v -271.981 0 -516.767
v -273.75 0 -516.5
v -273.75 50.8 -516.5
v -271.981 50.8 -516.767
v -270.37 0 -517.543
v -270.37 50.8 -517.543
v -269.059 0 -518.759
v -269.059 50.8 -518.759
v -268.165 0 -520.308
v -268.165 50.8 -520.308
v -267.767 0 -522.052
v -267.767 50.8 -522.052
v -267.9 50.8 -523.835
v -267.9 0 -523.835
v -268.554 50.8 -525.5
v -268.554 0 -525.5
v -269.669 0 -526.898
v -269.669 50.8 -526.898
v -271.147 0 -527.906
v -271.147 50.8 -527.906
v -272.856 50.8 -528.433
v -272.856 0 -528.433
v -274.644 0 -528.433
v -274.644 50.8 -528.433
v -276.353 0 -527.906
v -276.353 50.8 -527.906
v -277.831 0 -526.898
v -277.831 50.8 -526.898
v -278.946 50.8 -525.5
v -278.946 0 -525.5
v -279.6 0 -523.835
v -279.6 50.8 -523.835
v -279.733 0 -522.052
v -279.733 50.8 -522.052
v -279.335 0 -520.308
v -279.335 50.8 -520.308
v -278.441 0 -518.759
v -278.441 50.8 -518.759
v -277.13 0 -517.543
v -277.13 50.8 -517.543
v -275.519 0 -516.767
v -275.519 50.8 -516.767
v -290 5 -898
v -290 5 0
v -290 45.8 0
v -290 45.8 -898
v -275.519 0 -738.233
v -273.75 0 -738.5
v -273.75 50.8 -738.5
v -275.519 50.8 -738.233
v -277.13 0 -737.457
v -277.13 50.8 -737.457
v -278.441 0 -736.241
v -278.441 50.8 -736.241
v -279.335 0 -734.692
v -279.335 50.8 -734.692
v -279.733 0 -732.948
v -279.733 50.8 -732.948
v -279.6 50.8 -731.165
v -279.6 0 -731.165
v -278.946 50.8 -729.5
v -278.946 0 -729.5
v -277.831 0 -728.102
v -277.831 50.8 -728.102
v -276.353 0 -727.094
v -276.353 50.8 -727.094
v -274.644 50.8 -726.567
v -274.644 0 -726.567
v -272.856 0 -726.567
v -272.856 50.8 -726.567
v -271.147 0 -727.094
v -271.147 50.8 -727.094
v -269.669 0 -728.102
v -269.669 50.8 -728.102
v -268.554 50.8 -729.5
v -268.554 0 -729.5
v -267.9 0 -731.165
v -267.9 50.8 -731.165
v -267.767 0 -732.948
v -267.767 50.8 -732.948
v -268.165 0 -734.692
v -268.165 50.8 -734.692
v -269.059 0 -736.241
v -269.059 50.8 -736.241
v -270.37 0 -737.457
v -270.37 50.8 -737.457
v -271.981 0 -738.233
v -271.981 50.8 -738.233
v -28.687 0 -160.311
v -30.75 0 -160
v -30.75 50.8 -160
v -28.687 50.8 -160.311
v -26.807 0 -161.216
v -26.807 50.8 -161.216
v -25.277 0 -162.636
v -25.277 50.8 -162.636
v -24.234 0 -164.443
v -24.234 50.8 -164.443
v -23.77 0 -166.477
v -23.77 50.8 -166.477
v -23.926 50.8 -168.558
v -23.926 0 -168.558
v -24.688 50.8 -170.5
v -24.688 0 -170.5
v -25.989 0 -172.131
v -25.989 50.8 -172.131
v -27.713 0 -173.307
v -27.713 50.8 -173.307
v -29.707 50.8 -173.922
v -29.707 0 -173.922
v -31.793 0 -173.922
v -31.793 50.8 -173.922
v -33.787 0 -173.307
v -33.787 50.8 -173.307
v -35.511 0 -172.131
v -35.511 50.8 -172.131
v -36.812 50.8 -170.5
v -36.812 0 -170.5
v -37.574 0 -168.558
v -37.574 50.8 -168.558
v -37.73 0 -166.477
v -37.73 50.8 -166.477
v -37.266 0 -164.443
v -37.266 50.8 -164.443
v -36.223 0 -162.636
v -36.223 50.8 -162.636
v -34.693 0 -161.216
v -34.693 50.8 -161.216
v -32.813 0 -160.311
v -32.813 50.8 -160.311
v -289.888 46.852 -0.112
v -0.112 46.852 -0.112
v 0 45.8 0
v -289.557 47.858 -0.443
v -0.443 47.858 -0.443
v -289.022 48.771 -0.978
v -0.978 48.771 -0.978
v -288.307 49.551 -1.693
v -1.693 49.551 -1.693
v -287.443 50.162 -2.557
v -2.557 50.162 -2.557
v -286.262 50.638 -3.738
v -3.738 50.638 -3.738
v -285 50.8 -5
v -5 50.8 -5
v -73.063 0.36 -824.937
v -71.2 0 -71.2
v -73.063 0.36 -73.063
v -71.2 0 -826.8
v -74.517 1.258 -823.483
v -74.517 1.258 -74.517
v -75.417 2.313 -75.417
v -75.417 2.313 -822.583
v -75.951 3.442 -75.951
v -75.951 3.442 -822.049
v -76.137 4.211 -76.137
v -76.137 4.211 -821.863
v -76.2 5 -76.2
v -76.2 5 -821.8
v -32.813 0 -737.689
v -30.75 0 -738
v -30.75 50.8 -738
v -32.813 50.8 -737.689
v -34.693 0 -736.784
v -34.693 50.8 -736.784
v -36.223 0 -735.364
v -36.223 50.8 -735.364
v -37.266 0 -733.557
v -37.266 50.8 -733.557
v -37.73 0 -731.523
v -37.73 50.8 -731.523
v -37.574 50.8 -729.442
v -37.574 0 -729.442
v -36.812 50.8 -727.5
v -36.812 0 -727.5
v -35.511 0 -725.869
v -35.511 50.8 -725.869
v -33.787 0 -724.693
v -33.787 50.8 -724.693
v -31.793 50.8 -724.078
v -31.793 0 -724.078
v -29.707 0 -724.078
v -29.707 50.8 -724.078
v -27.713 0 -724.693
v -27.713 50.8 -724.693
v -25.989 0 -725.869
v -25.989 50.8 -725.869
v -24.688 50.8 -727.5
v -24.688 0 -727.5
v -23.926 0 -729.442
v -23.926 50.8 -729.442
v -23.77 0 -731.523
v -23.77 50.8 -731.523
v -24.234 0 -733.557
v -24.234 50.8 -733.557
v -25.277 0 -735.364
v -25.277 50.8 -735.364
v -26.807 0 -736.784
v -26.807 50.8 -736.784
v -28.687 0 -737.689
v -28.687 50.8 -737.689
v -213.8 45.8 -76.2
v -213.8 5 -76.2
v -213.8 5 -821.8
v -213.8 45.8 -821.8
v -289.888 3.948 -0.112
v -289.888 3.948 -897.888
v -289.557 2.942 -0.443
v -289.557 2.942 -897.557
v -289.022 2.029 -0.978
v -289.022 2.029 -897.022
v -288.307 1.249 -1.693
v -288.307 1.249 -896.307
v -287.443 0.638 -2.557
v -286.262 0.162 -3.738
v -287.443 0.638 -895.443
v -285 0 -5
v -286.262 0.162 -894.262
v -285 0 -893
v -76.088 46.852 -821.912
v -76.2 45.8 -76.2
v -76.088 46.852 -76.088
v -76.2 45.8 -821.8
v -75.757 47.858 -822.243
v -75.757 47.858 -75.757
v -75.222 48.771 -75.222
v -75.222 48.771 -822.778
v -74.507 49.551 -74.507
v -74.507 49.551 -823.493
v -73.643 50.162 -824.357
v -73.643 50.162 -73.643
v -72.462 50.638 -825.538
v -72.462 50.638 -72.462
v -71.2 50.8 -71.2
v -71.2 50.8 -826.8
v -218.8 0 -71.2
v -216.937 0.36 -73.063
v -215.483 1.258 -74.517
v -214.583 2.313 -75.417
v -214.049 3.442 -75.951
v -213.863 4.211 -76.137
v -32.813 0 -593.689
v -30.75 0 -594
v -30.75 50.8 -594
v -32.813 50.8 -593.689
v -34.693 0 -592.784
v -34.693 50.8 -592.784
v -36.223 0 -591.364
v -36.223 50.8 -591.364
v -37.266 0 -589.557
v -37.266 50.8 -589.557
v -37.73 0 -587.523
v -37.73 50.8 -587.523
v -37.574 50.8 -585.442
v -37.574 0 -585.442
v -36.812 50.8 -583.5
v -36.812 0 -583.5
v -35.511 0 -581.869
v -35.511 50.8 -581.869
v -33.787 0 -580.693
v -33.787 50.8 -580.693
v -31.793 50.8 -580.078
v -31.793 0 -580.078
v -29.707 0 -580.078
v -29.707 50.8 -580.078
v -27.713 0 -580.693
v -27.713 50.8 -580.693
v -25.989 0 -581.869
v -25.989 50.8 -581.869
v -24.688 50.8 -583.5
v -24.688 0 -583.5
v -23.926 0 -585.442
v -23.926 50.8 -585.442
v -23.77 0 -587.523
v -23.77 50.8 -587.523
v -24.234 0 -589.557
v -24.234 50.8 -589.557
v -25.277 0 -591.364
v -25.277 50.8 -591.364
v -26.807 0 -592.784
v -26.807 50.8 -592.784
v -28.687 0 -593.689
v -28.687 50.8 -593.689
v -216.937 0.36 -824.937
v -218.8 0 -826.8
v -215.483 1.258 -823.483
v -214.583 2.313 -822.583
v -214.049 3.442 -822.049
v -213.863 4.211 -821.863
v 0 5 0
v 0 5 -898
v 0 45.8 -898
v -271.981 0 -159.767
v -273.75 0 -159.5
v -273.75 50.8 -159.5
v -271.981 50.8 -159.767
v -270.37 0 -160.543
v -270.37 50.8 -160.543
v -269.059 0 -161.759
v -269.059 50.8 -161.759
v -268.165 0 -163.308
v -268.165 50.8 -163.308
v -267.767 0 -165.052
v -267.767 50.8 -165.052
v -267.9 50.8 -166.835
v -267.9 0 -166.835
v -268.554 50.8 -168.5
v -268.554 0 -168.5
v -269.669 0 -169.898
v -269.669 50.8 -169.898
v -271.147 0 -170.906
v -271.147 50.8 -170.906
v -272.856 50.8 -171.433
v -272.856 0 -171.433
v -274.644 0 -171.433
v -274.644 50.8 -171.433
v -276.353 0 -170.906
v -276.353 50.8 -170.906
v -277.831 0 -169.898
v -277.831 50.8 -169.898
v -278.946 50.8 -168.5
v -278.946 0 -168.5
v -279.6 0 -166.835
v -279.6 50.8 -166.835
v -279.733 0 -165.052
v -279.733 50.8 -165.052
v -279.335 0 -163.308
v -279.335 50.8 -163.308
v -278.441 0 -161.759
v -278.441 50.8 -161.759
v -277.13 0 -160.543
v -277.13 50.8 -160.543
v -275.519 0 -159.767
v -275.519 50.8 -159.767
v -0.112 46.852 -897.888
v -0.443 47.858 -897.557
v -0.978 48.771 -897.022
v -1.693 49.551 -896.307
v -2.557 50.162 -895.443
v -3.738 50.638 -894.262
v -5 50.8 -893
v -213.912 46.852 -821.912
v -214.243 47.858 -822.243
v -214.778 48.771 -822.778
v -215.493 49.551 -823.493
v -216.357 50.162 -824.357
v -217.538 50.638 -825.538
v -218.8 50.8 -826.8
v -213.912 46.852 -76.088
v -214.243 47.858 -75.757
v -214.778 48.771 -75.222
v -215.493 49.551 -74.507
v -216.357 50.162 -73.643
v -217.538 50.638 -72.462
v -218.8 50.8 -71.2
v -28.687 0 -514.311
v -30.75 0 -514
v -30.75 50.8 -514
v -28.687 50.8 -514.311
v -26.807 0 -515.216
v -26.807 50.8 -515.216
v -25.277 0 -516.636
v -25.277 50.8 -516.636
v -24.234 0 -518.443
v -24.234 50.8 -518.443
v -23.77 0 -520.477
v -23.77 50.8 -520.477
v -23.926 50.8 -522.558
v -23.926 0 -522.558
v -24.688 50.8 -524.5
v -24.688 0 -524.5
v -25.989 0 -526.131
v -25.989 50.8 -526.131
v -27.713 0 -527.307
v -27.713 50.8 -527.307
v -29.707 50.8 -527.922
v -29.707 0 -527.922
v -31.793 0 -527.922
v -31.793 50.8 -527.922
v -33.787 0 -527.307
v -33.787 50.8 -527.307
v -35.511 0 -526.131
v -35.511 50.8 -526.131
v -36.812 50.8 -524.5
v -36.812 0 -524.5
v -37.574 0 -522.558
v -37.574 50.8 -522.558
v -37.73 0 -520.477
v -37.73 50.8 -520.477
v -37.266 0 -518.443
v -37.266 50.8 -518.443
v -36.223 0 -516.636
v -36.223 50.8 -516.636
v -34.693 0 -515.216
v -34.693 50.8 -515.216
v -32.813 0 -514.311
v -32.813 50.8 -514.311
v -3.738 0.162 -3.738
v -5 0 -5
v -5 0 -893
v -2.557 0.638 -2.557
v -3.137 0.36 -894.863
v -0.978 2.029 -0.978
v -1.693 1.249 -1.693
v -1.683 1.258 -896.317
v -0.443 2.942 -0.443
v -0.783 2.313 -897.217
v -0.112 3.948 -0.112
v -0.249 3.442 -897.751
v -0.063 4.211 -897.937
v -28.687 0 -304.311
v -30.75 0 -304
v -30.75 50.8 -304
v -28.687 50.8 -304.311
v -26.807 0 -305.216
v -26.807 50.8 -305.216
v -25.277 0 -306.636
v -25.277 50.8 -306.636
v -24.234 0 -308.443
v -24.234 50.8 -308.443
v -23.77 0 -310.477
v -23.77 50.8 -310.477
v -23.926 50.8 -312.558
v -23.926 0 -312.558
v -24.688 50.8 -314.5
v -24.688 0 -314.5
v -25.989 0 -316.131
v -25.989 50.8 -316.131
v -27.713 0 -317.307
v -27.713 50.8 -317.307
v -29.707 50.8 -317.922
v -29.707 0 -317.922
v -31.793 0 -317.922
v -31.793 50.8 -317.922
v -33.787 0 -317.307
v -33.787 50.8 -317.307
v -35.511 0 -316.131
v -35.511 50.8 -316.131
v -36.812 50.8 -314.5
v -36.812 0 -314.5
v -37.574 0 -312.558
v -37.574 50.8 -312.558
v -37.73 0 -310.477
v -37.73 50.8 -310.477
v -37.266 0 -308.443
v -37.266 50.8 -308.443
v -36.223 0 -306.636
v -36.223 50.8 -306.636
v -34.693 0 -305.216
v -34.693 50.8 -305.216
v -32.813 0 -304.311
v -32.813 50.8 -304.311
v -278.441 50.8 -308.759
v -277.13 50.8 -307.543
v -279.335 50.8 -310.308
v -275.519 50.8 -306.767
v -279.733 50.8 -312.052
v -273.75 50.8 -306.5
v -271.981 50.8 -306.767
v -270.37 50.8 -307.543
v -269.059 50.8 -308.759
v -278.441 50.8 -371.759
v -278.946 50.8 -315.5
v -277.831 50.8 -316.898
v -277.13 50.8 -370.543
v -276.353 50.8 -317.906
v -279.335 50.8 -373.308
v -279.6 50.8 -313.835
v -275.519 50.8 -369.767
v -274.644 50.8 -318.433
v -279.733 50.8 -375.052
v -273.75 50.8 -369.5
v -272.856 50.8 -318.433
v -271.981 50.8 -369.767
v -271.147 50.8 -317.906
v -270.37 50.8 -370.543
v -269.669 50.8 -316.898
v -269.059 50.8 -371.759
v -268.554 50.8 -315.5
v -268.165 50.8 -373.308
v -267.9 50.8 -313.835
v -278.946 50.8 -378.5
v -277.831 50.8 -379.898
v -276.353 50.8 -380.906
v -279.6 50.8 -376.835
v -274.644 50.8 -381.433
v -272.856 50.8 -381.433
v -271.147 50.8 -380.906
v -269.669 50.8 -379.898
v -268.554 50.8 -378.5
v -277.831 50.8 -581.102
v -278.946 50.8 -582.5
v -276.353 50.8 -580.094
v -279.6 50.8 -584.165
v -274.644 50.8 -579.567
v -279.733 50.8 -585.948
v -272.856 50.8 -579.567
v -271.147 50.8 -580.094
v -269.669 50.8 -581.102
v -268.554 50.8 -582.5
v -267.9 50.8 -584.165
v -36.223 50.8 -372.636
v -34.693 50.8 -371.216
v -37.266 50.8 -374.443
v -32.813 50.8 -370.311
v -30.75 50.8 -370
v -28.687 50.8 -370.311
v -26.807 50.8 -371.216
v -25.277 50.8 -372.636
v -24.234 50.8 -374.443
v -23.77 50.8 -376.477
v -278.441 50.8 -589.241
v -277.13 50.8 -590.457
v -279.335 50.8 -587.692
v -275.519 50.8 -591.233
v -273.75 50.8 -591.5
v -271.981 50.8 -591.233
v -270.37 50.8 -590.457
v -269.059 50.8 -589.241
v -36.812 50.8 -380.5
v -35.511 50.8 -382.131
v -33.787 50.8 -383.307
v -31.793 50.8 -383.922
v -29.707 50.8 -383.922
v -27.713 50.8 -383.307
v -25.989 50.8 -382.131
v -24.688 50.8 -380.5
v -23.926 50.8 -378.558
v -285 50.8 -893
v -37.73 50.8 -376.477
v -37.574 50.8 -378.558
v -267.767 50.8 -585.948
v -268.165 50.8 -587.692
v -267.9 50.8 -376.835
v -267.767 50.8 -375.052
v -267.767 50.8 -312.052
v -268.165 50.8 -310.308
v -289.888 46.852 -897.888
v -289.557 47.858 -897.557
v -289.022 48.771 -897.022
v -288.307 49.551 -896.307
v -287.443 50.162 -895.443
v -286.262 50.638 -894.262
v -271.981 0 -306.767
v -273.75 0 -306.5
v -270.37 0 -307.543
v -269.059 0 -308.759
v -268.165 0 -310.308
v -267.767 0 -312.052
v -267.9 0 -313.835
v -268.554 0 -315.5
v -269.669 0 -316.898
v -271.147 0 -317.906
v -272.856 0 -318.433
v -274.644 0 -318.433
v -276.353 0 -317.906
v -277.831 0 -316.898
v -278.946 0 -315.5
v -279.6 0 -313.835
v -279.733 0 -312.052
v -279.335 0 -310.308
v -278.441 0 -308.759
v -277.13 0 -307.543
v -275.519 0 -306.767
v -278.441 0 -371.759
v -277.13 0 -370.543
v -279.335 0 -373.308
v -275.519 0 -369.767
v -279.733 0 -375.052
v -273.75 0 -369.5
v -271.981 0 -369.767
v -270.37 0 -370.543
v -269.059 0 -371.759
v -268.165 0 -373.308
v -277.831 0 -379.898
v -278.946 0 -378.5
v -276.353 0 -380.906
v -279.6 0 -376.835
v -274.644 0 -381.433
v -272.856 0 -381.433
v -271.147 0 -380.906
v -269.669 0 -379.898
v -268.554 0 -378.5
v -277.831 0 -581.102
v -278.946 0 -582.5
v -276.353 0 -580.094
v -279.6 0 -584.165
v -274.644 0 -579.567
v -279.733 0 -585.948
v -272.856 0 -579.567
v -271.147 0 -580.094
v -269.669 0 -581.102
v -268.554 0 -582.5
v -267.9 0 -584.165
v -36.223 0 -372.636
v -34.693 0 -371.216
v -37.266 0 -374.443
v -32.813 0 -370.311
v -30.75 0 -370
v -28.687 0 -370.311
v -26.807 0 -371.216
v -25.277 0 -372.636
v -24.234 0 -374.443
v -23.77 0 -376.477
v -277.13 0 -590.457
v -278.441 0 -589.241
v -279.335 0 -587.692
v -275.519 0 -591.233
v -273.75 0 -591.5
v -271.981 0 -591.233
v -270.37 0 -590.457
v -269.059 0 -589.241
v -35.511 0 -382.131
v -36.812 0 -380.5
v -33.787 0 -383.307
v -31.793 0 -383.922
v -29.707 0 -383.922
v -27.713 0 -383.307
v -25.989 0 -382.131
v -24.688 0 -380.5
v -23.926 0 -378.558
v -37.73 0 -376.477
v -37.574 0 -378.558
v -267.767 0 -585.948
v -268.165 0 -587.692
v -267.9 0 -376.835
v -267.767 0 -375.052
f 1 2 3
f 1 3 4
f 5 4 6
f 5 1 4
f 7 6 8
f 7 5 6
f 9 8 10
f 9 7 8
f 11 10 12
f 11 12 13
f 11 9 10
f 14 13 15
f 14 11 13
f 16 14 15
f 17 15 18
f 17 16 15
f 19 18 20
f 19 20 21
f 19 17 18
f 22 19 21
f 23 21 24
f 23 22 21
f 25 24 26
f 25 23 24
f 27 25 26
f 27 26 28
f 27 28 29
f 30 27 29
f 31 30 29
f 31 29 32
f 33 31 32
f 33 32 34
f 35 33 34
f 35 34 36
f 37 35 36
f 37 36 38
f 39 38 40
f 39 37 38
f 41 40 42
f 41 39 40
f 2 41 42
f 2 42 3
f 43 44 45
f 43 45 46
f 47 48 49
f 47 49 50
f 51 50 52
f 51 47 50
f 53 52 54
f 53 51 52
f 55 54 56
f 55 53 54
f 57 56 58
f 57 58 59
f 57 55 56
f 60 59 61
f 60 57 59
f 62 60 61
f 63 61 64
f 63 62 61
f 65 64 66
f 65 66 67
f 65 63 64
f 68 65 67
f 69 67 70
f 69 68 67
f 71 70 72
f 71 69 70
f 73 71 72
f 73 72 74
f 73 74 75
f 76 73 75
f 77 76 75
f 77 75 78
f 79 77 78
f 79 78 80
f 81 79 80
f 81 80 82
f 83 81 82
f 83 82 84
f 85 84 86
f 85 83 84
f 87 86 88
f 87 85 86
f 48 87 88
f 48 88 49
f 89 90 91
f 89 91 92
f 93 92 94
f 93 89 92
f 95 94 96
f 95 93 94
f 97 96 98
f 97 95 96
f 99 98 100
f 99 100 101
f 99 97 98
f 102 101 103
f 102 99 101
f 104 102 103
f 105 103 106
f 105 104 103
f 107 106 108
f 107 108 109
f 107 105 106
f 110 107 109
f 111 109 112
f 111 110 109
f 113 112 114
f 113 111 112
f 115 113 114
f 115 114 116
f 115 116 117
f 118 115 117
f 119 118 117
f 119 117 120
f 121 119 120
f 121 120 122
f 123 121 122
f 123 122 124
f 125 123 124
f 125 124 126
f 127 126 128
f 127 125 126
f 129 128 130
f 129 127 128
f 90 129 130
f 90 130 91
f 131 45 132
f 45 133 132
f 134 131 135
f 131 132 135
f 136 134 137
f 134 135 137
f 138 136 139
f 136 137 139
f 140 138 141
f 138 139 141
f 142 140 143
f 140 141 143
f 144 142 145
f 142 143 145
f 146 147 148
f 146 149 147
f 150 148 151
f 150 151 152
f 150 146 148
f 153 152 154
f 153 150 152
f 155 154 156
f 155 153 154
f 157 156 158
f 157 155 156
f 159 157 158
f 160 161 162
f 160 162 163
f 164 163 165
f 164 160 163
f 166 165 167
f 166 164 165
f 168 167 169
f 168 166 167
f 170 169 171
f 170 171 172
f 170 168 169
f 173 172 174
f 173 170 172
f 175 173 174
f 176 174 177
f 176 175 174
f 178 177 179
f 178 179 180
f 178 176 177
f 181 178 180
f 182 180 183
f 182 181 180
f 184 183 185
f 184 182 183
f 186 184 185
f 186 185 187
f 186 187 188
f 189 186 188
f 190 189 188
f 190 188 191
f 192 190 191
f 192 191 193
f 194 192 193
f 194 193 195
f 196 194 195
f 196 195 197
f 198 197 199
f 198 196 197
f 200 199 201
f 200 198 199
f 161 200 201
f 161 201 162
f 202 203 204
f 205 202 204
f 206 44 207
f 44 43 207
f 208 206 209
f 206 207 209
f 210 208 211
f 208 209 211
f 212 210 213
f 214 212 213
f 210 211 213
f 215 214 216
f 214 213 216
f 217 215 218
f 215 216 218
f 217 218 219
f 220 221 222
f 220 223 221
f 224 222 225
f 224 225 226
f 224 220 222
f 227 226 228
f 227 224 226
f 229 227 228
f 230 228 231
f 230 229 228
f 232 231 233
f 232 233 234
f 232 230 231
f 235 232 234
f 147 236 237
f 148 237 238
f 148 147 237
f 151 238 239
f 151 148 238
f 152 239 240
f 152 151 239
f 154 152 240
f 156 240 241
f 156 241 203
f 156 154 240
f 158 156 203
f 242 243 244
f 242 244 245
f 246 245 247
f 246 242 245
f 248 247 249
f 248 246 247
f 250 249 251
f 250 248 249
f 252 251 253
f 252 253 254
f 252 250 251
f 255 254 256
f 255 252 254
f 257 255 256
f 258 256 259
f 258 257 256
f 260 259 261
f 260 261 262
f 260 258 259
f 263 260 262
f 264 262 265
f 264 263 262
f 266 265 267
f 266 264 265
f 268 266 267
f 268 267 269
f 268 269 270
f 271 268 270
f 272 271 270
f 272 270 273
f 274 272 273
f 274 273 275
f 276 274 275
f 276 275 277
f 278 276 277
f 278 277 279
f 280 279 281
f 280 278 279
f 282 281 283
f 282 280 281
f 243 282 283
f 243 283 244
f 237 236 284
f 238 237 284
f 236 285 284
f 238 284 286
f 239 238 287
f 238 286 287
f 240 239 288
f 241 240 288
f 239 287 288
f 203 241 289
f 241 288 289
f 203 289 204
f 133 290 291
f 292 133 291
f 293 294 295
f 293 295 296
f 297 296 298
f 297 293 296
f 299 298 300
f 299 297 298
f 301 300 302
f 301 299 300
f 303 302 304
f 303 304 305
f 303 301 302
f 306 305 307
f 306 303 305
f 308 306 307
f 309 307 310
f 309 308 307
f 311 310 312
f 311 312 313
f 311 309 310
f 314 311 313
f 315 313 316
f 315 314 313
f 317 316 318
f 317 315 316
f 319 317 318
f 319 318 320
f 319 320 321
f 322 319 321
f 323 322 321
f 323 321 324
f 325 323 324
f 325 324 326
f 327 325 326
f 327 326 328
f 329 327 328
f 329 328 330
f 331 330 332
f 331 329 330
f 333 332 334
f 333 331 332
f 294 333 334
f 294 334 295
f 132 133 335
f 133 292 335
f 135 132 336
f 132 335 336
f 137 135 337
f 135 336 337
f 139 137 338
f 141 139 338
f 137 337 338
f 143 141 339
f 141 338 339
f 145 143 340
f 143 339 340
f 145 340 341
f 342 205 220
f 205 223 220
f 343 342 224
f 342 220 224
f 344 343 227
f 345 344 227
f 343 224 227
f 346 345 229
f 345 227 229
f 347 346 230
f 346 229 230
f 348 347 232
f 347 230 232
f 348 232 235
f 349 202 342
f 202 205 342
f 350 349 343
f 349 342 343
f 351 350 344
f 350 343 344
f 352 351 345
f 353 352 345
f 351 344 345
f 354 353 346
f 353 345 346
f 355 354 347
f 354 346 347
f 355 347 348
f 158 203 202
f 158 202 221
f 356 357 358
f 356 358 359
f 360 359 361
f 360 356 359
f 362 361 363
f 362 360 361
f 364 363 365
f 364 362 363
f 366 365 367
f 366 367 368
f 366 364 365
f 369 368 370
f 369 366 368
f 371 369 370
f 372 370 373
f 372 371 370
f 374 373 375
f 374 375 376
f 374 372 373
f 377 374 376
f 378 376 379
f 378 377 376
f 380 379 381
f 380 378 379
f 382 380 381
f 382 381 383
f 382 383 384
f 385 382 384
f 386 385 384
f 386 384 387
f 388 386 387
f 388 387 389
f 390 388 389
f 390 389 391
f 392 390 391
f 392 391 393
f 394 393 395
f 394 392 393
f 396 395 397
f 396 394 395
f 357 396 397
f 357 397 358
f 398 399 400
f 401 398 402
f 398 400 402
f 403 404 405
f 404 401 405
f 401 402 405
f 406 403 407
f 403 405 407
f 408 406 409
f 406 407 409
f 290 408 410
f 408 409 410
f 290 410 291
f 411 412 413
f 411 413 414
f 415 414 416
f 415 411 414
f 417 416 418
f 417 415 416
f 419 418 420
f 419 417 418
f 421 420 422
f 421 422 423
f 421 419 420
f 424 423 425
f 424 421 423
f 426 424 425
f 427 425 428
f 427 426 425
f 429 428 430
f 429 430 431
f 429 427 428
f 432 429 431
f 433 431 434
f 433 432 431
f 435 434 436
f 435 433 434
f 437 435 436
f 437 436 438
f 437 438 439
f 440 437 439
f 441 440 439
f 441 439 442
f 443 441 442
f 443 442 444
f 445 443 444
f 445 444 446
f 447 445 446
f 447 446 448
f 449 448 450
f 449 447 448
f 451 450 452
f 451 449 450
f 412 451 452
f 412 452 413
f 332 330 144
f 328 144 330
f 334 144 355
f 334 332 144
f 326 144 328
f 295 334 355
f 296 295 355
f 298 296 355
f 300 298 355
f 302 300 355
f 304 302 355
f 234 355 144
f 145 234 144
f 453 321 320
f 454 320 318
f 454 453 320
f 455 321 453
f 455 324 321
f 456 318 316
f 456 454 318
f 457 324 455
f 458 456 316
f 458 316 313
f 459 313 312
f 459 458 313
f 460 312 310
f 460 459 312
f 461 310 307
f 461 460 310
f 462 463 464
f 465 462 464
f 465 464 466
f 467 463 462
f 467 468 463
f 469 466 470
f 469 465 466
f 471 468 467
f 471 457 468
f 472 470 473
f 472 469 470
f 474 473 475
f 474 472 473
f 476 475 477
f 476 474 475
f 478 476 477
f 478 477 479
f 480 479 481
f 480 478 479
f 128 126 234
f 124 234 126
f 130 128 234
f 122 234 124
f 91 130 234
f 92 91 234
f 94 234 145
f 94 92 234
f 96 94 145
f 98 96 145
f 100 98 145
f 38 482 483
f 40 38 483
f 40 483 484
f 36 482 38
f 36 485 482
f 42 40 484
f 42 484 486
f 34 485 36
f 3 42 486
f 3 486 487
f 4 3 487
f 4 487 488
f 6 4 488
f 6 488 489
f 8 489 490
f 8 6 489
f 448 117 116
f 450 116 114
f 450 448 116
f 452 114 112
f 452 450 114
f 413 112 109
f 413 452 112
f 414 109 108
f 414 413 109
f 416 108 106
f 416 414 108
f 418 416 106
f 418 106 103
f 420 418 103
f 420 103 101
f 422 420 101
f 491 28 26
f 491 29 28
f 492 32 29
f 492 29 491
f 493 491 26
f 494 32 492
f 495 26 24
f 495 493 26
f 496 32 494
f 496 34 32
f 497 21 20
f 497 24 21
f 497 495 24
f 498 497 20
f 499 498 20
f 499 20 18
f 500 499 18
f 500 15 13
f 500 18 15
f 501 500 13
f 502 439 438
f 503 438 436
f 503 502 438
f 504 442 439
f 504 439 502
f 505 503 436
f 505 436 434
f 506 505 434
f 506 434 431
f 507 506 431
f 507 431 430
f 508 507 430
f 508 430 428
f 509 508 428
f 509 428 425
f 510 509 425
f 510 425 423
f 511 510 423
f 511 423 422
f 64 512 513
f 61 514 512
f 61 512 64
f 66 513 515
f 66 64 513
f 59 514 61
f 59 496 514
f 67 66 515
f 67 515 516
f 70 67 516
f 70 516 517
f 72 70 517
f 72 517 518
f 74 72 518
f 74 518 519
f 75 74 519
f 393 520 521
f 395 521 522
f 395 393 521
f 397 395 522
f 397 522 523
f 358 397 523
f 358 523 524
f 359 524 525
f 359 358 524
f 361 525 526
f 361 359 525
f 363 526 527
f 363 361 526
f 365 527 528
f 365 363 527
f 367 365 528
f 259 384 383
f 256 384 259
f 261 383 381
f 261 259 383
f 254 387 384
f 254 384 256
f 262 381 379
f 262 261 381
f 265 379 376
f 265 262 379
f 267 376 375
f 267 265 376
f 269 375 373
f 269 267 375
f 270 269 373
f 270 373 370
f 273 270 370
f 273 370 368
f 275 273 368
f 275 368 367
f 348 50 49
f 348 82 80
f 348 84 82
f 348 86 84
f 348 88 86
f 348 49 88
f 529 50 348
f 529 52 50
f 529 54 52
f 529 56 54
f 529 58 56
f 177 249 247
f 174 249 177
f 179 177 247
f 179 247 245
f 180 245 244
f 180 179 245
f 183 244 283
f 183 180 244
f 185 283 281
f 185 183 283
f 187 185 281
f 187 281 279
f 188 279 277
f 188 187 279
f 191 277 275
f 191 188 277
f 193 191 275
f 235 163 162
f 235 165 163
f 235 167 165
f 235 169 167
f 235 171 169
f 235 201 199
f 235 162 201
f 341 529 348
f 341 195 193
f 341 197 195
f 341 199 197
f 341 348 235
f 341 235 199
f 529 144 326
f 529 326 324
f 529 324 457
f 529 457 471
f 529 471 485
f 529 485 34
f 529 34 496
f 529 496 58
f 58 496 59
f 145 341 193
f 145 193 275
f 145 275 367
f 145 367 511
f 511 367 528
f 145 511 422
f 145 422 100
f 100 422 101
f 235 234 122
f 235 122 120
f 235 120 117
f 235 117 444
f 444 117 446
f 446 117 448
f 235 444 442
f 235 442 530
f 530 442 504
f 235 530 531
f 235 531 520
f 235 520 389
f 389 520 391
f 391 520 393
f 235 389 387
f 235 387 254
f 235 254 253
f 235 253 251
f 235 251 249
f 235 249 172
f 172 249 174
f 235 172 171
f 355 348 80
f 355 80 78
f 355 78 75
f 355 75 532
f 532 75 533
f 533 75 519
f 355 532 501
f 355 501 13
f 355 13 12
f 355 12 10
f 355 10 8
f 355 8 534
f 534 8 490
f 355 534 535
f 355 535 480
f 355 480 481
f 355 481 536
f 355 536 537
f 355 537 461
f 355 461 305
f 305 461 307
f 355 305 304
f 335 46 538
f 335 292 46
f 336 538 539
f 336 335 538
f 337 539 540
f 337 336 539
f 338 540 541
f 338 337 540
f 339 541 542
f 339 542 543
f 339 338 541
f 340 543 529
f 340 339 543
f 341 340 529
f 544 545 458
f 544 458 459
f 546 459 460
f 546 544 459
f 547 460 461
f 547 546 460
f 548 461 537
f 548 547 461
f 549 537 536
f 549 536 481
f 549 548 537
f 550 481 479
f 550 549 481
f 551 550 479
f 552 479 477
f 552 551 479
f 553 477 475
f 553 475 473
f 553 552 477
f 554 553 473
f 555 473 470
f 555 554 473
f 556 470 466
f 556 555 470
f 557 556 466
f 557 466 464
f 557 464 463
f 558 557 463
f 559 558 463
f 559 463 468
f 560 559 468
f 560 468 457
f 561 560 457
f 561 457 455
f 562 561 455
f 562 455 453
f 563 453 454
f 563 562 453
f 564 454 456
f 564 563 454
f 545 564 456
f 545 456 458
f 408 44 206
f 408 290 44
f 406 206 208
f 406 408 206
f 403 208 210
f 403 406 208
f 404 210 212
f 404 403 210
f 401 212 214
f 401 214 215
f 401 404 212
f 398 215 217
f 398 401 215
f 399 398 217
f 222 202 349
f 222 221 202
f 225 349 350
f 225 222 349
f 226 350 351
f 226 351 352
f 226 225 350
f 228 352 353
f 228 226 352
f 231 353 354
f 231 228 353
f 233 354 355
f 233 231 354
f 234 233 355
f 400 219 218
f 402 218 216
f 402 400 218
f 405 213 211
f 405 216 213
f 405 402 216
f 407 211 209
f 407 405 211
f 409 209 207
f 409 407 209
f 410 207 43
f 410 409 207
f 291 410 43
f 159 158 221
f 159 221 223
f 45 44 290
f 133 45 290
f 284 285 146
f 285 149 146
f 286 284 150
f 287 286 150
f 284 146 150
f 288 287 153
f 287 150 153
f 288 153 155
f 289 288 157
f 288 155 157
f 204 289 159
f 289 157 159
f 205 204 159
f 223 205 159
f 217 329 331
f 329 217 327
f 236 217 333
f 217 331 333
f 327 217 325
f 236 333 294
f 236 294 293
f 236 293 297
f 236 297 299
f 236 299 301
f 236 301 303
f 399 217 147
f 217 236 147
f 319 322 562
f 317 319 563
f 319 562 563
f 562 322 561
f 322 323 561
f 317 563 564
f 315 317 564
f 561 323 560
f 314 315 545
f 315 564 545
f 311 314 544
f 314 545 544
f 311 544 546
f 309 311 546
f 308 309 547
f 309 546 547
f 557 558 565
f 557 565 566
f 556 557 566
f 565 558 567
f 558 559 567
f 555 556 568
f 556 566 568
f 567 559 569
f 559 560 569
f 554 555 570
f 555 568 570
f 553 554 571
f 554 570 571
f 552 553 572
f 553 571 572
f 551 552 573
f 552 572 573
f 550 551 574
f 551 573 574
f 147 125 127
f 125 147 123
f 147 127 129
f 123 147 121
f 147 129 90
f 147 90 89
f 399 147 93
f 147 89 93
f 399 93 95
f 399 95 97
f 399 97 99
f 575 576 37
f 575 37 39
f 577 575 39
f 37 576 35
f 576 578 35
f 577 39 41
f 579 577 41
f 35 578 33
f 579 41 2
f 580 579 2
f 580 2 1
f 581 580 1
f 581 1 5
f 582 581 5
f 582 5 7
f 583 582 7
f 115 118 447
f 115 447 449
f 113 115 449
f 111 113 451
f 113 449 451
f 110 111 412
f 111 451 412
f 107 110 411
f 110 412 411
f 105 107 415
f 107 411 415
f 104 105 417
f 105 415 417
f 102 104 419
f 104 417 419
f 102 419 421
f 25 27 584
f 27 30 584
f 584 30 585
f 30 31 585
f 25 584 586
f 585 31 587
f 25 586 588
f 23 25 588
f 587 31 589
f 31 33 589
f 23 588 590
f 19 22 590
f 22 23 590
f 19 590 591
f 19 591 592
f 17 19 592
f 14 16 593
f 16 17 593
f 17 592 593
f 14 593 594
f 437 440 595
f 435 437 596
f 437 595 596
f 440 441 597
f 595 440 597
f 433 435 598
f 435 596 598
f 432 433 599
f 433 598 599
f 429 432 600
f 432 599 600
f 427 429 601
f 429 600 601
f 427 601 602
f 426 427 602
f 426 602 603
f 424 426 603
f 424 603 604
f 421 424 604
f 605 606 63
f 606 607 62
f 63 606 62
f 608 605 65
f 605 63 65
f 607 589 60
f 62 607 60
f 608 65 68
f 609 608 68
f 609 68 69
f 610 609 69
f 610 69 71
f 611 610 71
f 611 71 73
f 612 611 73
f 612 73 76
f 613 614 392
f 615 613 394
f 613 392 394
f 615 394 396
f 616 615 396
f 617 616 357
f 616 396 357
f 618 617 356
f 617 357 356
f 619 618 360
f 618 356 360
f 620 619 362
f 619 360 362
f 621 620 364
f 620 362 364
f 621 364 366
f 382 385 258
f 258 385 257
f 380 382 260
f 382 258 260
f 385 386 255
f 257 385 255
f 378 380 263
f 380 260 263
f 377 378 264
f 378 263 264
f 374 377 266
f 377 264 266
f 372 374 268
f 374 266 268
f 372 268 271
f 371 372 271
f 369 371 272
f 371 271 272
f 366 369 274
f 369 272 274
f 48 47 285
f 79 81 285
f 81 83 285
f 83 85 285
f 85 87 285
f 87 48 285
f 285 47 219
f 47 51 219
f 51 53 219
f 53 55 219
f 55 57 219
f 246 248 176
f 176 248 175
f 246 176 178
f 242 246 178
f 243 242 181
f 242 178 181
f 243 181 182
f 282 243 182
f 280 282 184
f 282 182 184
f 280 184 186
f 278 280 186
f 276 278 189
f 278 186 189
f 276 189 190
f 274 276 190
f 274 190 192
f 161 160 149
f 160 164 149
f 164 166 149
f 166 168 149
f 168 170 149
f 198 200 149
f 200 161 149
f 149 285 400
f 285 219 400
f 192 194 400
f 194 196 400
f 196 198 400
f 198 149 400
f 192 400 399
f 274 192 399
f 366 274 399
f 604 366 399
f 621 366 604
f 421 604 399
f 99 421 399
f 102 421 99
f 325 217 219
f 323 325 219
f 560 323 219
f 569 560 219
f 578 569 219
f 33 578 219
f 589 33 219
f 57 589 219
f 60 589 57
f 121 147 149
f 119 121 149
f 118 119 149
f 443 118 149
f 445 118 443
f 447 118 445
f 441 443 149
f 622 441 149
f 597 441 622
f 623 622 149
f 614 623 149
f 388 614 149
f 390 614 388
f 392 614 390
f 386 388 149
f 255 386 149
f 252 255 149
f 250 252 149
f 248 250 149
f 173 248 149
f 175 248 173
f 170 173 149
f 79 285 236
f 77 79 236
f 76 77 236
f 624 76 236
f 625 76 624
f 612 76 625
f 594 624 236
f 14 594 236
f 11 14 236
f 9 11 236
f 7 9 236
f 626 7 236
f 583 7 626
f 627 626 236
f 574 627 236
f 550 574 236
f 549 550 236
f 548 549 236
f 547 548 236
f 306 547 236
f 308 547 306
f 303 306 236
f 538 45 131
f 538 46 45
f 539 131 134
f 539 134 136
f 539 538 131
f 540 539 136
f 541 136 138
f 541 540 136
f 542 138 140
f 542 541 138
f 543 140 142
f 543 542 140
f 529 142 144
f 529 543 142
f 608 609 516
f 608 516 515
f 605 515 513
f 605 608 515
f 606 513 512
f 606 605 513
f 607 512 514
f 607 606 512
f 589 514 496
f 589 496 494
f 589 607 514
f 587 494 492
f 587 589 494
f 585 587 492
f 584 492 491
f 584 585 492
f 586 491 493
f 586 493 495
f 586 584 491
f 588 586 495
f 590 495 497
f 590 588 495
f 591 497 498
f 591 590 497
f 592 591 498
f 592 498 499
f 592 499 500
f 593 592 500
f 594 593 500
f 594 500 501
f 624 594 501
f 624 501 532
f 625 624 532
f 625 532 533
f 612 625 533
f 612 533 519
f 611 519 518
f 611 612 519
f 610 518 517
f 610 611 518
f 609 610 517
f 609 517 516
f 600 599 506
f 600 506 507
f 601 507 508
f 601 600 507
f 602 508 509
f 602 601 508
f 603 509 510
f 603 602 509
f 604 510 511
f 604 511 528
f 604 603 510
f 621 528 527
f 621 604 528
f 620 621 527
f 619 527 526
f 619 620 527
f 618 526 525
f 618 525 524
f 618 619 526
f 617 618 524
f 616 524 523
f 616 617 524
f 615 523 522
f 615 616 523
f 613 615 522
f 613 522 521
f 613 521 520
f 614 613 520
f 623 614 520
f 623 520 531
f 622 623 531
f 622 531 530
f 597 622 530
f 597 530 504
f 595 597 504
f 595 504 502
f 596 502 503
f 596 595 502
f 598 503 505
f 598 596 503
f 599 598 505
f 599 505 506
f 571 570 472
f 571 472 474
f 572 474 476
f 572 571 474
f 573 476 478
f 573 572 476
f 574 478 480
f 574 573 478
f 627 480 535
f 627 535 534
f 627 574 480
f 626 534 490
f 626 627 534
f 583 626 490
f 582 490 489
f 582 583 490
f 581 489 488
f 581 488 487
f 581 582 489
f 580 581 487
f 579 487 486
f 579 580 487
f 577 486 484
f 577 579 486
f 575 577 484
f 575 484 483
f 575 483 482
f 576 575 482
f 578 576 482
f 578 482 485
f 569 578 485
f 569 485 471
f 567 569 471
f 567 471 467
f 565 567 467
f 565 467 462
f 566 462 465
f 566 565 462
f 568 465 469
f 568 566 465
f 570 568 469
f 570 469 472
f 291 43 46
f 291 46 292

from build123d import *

# Parameters (mm, degrees)
CROQUIS1_W              = 290
CROQUIS1_H              = 898
CROQUIS1_R              = 6
CROQUIS1_R_2            = 7
CROQUIS1_W_2            = 137.6
CROQUIS1_H_2            = 745.6
SALIENTE_EXTRUIR1_DEPTH = 50.8
REDONDEO1_R             = 5
REDONDEO2_R             = 5


with BuildPart() as part:
    # Croquis1 → Saliente-Extruir1 (new body)
    with BuildSketch(Plane(origin=(0, 0, 0), x_dir=(1, 0, 0), z_dir=(0, 1, 0))):
        with Locations((-145, 449)):
            Rectangle(CROQUIS1_W, CROQUIS1_H)
        with Locations(Location((-273.75, 375.5, 0), (0, 0, 270))):
            Circle(CROQUIS1_R, mode=Mode.SUBTRACT)
        with Locations(Location((-273.75, 522.5, 0), (0, 0, 270))):
            Circle(CROQUIS1_R, mode=Mode.SUBTRACT)
        with Locations(Location((-30.75, 377, 0), (0, 0, 270))):
            Circle(CROQUIS1_R_2, mode=Mode.SUBTRACT)
        with Locations(Location((-30.75, 521, 0), (0, 0, 270))):
            Circle(CROQUIS1_R_2, mode=Mode.SUBTRACT)
        with Locations(Location((-30.75, 167, 0), (0, 0, 270))):
            Circle(CROQUIS1_R_2, mode=Mode.SUBTRACT)
        with Locations(Location((-273.75, 732.5, 0), (0, 0, 90))):
            Circle(CROQUIS1_R, mode=Mode.SUBTRACT)
        with Locations(Location((-273.75, 312.5, 0), (0, 0, 270))):
            Circle(CROQUIS1_R, mode=Mode.SUBTRACT)
        with Locations(Location((-30.75, 311, 0), (0, 0, 270))):
            Circle(CROQUIS1_R_2, mode=Mode.SUBTRACT)
        with Locations(Location((-273.75, 165.5, 0), (0, 0, 270))):
            Circle(CROQUIS1_R, mode=Mode.SUBTRACT)
        with Locations(Location((-30.75, 587, 0), (0, 0, 90))):
            Circle(CROQUIS1_R_2, mode=Mode.SUBTRACT)
        with Locations(Location((-273.75, 585.5, 0), (0, 0, 90))):
            Circle(CROQUIS1_R, mode=Mode.SUBTRACT)
        with Locations(Location((-30.75, 731, 0), (0, 0, 90))):
            Circle(CROQUIS1_R_2, mode=Mode.SUBTRACT)
        with Locations((-145, 449)):
            Rectangle(CROQUIS1_W_2, CROQUIS1_H_2, mode=Mode.SUBTRACT)
    extrude(amount=SALIENTE_EXTRUIR1_DEPTH)

    # Redondeo1
    redondeo1_edges = [part.edges().sort_by_distance(p)[0] for p in [
        (-290, 50.8, -449),
        (-145, 50.8, 0),
        (-76.2, 50.8, -449),
        (-145, 50.8, -821.8),
        (-213.8, 50.8, -449),
        (-145, 50.8, -76.2),
        (0, 50.8, -449),
        (-145, 50.8, -898),
    ]]
    fillet(redondeo1_edges, radius=REDONDEO1_R)

    # Redondeo2
    redondeo2_edges = [part.edges().sort_by_distance(p)[0] for p in [
        (-76.2, 0, -449),
        (-145, 0, -821.8),
        (-213.8, 0, -449),
        (-145, 0, -76.2),
        (-145, 0, 0),
        (-290, 0, -449),
        (-145, 0, -898),
        (0, 0, -449),
    ]]
    fillet(redondeo2_edges, radius=REDONDEO2_R)


solid = part.part
